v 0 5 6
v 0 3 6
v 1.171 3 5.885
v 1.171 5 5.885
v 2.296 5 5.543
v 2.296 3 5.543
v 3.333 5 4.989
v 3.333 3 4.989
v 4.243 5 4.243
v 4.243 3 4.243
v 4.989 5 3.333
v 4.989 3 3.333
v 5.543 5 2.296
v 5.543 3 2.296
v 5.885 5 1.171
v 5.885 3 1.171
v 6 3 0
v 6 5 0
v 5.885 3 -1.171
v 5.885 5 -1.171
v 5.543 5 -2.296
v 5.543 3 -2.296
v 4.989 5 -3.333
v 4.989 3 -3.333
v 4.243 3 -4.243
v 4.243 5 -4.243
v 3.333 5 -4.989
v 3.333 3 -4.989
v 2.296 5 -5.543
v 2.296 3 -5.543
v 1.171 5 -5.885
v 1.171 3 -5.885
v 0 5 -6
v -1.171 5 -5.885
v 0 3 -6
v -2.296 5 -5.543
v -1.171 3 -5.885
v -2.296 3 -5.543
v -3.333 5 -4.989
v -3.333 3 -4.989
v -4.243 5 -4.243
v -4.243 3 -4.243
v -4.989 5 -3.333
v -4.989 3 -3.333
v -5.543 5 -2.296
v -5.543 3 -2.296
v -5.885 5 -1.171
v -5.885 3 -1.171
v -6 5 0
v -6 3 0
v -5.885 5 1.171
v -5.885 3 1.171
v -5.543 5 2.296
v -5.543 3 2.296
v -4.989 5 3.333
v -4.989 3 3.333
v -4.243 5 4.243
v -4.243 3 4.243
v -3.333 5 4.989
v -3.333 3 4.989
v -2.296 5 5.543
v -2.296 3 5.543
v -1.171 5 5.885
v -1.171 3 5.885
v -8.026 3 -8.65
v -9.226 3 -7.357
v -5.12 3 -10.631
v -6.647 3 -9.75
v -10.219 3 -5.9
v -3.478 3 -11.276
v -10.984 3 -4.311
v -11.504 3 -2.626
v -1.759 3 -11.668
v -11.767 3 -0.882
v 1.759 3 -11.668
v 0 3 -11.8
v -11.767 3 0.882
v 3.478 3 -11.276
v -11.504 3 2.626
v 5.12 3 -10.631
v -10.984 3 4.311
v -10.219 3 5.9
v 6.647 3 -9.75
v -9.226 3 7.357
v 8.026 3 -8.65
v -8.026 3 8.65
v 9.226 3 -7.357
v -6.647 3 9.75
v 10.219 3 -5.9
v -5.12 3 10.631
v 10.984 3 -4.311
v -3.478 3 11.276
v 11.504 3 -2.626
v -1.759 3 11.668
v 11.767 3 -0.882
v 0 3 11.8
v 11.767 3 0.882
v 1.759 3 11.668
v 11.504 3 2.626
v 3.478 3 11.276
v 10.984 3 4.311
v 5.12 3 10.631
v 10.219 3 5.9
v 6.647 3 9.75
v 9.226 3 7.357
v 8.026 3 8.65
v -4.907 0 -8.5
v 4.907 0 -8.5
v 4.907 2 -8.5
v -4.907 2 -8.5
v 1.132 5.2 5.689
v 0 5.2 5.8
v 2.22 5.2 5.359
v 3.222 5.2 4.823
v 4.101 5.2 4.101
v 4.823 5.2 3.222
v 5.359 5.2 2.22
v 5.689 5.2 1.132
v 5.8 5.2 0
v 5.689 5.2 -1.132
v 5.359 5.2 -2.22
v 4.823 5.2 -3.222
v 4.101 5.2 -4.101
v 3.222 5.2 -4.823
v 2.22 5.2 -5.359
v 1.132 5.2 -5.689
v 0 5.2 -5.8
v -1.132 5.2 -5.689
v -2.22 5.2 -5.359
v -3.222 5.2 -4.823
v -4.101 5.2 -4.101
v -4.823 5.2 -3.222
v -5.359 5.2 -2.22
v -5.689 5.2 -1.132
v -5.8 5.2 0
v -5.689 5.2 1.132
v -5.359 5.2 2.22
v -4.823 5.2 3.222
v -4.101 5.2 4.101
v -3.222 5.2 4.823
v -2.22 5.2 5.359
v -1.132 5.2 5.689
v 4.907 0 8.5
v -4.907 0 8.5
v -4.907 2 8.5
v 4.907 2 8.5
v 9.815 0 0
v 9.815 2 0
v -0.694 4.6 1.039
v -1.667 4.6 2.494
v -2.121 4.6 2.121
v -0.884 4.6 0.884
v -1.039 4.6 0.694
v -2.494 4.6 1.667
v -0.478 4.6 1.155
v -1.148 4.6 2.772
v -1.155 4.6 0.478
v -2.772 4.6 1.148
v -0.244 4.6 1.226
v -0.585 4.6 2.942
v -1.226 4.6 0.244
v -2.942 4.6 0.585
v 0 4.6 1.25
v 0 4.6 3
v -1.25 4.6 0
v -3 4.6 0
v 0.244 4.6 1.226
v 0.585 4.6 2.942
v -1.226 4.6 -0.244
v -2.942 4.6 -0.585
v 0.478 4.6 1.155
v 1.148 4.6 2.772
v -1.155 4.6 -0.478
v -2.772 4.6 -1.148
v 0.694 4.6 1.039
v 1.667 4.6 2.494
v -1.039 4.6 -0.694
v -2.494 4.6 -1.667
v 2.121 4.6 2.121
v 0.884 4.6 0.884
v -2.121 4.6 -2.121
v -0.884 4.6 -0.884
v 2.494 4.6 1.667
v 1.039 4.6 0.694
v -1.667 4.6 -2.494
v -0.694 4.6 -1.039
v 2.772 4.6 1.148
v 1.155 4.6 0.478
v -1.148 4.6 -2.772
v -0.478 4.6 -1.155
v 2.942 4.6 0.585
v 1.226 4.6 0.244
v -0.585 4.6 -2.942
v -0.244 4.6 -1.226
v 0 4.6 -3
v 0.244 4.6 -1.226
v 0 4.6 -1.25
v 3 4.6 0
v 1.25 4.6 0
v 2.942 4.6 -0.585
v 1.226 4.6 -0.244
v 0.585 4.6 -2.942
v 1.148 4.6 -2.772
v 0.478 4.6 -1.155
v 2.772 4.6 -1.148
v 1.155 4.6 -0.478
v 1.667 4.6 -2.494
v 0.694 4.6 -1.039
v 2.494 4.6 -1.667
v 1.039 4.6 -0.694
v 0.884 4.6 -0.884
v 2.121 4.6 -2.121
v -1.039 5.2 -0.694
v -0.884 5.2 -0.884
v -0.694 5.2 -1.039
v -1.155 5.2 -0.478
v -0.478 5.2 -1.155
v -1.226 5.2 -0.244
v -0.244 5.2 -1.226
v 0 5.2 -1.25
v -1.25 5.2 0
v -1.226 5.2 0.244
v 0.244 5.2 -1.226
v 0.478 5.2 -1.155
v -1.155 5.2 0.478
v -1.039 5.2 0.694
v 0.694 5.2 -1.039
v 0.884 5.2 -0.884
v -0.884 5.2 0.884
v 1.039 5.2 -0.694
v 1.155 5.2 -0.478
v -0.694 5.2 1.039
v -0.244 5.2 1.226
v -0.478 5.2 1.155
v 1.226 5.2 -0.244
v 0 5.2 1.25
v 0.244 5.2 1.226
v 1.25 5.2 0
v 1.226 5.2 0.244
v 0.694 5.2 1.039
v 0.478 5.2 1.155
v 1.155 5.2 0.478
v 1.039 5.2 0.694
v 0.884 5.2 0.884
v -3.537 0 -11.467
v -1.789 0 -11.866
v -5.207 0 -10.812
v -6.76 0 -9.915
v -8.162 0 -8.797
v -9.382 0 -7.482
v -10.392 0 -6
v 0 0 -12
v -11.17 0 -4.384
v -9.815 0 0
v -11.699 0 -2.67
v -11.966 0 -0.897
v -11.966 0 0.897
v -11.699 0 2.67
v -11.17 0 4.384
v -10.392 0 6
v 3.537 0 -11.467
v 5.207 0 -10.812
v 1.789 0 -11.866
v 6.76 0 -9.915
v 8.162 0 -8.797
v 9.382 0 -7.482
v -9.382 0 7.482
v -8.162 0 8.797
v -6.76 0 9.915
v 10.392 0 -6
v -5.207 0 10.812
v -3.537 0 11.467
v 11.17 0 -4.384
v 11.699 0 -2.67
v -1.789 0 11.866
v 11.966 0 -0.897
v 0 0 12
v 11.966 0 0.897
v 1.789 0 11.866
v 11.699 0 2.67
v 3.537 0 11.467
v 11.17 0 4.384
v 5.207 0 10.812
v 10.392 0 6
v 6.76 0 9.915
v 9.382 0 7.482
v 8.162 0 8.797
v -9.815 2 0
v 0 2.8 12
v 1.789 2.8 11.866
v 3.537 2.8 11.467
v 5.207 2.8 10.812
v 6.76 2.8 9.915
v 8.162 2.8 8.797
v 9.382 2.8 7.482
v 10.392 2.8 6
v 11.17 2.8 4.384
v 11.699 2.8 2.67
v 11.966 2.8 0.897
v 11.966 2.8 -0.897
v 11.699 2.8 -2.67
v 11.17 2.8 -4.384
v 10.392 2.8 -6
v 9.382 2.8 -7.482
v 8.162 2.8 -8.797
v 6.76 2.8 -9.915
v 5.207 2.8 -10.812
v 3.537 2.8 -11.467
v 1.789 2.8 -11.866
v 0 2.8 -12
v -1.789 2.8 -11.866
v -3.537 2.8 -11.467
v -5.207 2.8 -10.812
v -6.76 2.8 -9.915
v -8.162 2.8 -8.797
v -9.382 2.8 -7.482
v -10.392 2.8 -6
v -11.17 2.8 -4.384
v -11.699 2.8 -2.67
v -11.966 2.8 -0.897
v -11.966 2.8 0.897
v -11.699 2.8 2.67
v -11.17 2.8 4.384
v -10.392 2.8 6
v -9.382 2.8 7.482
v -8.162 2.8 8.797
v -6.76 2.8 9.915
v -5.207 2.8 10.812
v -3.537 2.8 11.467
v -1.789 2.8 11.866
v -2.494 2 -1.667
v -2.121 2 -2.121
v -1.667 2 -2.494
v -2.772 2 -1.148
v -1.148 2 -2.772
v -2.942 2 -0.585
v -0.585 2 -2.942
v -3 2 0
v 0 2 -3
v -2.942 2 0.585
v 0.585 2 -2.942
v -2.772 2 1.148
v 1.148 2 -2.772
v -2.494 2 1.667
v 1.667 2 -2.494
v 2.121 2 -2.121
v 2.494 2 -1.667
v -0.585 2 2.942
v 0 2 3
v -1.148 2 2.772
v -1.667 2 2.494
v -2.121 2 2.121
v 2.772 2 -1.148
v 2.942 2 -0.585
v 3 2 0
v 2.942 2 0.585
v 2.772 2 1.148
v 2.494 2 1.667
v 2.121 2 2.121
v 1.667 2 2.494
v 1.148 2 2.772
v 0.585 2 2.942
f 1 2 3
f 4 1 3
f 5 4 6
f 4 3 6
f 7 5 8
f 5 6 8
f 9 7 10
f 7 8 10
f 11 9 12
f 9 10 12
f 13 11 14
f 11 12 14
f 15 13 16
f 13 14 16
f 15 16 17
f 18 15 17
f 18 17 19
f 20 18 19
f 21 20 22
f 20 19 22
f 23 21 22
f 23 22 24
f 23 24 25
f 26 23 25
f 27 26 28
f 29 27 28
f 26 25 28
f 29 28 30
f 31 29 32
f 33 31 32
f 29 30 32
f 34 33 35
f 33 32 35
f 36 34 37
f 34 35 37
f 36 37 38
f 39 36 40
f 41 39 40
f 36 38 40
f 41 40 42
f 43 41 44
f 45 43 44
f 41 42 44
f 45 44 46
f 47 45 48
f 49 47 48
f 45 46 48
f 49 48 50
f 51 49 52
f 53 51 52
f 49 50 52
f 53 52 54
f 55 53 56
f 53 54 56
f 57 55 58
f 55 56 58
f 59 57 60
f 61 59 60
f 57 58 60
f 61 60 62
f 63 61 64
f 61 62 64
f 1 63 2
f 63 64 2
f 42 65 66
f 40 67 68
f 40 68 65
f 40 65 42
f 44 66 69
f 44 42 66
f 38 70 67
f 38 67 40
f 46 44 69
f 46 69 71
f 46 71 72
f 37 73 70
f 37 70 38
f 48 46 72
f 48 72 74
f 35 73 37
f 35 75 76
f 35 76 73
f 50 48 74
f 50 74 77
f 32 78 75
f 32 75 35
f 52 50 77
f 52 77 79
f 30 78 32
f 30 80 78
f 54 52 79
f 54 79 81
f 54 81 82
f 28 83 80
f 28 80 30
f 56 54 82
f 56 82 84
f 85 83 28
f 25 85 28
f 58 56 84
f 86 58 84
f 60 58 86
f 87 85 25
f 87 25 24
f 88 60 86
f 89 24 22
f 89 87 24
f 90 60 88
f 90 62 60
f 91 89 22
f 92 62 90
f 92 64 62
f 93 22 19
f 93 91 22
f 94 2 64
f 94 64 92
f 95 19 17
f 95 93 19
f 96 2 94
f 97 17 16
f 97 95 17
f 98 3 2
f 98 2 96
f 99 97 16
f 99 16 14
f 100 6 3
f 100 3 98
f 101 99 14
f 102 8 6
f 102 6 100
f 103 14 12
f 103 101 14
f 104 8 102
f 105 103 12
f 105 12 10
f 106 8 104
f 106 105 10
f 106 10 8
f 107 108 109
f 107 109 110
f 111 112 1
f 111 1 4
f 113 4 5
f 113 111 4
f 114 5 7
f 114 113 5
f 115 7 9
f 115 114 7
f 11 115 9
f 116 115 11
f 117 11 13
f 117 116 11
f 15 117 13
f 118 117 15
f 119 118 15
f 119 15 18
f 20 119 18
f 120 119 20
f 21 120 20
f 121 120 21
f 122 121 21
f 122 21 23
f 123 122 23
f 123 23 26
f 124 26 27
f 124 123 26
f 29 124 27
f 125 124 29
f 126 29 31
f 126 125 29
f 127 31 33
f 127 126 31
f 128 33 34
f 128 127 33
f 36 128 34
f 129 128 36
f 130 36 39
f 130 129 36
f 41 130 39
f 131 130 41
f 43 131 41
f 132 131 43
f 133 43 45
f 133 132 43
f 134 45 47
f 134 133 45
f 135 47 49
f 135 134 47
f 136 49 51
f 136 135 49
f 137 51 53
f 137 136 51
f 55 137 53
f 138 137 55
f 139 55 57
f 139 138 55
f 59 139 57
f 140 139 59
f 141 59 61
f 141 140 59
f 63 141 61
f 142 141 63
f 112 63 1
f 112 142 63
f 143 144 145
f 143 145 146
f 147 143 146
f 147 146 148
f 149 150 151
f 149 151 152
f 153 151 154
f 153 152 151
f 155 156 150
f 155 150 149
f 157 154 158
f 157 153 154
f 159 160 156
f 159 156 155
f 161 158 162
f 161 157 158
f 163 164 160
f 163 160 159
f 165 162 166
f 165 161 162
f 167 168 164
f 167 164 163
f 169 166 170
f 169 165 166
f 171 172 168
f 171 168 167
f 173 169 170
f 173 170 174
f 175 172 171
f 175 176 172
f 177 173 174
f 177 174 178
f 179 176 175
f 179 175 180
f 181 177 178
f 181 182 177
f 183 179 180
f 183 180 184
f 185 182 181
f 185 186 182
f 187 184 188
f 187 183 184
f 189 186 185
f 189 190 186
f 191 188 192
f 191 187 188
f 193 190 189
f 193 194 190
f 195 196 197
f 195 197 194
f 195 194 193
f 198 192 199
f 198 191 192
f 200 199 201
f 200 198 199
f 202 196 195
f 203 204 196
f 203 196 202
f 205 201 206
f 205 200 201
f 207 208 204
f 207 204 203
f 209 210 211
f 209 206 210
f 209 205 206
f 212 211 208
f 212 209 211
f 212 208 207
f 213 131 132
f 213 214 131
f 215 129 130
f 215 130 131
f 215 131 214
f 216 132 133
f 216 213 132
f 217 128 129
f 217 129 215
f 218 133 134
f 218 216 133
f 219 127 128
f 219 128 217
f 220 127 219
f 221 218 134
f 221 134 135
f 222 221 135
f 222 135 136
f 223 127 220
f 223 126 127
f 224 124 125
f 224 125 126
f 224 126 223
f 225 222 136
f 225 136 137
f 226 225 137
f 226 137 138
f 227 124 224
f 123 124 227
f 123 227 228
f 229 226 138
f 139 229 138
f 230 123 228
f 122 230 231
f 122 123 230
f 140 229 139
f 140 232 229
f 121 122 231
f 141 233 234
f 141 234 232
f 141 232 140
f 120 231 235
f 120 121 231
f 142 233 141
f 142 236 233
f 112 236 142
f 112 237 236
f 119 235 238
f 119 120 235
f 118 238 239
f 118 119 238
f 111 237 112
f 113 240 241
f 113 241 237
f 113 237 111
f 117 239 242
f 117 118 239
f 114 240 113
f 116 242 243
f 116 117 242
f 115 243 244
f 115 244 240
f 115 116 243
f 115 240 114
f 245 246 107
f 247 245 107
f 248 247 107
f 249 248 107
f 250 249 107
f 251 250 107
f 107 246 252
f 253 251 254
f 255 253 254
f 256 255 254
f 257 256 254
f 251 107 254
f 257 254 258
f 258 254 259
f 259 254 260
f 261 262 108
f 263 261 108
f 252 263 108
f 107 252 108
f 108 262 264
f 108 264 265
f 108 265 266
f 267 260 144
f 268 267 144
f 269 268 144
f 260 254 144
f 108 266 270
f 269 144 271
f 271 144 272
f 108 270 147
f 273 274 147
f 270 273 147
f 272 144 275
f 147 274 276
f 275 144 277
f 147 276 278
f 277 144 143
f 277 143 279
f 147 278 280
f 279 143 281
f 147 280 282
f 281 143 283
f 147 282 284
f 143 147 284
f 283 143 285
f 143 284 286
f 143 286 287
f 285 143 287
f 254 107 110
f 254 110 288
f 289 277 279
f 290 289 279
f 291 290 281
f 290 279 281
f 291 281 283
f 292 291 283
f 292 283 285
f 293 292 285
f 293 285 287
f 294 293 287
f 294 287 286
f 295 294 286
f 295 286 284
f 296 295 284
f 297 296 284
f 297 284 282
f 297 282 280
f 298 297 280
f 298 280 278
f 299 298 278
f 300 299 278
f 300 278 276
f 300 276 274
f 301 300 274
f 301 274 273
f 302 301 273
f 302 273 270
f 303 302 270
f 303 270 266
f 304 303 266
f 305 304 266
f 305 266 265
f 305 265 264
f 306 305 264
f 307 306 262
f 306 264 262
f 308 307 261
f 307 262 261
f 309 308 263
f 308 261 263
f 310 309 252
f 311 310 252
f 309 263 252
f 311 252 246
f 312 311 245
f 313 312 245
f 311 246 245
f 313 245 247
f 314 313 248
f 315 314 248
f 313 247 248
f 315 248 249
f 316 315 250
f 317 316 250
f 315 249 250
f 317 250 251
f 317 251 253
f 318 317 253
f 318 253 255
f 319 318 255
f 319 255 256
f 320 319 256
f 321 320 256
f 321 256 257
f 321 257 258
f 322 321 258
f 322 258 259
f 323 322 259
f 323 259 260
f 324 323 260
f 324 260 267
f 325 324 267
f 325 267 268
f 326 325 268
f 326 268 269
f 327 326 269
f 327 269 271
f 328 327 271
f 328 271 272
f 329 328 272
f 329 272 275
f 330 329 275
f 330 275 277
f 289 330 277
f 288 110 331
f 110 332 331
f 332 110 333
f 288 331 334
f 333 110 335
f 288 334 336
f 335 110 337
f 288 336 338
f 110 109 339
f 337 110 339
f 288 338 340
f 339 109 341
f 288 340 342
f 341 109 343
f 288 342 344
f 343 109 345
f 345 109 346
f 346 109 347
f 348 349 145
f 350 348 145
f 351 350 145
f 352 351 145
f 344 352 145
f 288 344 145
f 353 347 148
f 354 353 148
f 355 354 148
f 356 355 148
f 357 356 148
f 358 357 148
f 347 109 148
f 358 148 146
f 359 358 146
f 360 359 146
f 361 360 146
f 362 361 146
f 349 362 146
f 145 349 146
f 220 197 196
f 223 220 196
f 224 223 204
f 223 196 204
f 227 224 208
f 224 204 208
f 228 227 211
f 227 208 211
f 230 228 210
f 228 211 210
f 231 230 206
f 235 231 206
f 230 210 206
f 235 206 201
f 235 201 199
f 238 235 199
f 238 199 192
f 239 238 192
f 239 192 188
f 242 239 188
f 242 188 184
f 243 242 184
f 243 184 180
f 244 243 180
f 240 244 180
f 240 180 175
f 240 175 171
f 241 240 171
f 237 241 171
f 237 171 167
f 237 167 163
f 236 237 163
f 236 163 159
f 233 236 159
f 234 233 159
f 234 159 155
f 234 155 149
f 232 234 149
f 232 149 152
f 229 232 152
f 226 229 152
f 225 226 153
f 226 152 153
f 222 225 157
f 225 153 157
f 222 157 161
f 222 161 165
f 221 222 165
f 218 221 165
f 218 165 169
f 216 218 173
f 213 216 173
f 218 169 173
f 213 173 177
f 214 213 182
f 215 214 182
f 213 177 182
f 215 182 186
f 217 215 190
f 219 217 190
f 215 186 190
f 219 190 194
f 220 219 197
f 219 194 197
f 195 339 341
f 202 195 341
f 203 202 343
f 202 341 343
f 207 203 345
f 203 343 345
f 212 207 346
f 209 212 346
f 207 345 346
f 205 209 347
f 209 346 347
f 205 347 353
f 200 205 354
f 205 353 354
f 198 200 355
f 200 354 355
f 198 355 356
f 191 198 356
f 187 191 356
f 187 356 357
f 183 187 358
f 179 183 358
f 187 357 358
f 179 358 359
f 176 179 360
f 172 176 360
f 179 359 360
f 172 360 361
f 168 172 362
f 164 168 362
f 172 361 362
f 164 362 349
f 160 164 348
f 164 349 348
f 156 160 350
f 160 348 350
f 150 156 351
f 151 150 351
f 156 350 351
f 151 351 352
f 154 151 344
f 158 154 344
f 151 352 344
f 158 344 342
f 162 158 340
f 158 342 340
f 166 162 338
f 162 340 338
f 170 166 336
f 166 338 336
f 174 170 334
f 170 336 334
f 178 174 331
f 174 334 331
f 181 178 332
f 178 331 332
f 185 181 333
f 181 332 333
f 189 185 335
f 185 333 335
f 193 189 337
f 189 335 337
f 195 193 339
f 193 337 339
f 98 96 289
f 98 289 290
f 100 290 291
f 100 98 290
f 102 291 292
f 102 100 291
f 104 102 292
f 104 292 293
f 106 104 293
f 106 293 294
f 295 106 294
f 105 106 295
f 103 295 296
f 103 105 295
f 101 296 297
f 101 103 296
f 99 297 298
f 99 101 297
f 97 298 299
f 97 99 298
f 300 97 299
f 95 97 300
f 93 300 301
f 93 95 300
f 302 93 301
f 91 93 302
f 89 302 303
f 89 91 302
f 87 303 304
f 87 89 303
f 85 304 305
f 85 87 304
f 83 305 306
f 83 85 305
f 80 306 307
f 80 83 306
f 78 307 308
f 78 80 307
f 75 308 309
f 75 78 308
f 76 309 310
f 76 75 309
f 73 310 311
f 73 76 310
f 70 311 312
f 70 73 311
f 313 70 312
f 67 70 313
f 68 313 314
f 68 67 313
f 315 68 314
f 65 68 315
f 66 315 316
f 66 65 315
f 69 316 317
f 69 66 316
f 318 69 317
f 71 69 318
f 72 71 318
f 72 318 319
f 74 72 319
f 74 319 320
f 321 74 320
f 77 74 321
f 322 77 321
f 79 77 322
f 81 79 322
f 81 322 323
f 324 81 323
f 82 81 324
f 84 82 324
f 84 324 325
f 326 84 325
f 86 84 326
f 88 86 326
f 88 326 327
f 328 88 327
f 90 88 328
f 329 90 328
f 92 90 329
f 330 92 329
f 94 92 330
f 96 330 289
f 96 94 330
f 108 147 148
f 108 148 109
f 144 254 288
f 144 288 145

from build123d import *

# Parameters (mm, degrees)
SKETCH1_R           = 12
BOSS_EXTRUDE1_DEPTH = 2
SKETCH2_R           = 12
BOSS_EXTRUDE2_DEPTH = 1
SKETCH3_R           = 6
BOSS_EXTRUDE3_DEPTH = 2.2
SKETCH4_R           = 3
CUT_EXTRUDE1_DEPTH  = 2.6
CUT_EXTRUDE2_REACH  = 19.583
SKETCH5_R           = 1.25
CHAMFER1_SIZE       = 0.2


with BuildPart() as part:
    # Sketch1 → Boss-Extrude1 (new body)
    with BuildSketch(Plane(origin=(0, 0, 0), x_dir=(1, 0, 0), z_dir=(0, 1, 0))):
        with Locations(Location((0, 0, 0), (0, 0, 270))):
            Circle(SKETCH1_R)
        Polygon((-4.907477288, -8.5), (4.907477288, -8.5), (9.814954576, 0), (4.907477288, 8.5), (-4.907477288, 8.5), (-9.814954576, 0), align=None, mode=Mode.SUBTRACT)
    extrude(amount=BOSS_EXTRUDE1_DEPTH)

    # Sketch2 → Boss-Extrude2 (add)
    with BuildSketch(Plane(origin=(0, 2, 0), x_dir=(1, 0, 0), z_dir=(0, 1, 0))):
        with Locations(Location((0, 0, 0), (0, 0, 270))):
            Circle(SKETCH2_R)
    extrude(amount=BOSS_EXTRUDE2_DEPTH)

    # Sketch3 → Boss-Extrude3 (add)
    with BuildSketch(Plane(origin=(0, 3, 0), x_dir=(1, 0, 0), z_dir=(0, 1, 0))):
        with Locations(Location((0, 0, 0), (0, 0, 270))):
            Circle(SKETCH3_R)
    extrude(amount=BOSS_EXTRUDE3_DEPTH)

    # Sketch4 → Cut-Extrude1 (cut)
    with BuildSketch(Plane.XZ.offset(-2)):
        with Locations(Location((0, 0, 0), (0, 0, 270))):
            Circle(SKETCH4_R)
    extrude(amount=-CUT_EXTRUDE1_DEPTH, mode=Mode.SUBTRACT)

    # Sketch5 → Cut-Extrude2 (cut, up to next)
    with BuildSketch(Plane.XZ.offset(-4.6), mode=Mode.PRIVATE) as cut_extrude2_sk1:
        with Locations(Location((0, 0, 0), (0, 0, 270))):
            Circle(SKETCH5_R)
    cut_extrude2_tool1 = extrude(cut_extrude2_sk1.sketch, amount=-CUT_EXTRUDE2_REACH, mode=Mode.PRIVATE) & part.part
    add(cut_extrude2_tool1.solids().sort_by_distance((0, 4.6, 0))[0], mode=Mode.SUBTRACT)

    # Chamfer1
    chamfer1_edges = [part.edges().sort_by_distance(p)[0] for p in [
        (0, 3, -12),
        (0, 5.2, -6),
    ]]
    chamfer(chamfer1_edges, length=CHAMFER1_SIZE)


solid = part.part
